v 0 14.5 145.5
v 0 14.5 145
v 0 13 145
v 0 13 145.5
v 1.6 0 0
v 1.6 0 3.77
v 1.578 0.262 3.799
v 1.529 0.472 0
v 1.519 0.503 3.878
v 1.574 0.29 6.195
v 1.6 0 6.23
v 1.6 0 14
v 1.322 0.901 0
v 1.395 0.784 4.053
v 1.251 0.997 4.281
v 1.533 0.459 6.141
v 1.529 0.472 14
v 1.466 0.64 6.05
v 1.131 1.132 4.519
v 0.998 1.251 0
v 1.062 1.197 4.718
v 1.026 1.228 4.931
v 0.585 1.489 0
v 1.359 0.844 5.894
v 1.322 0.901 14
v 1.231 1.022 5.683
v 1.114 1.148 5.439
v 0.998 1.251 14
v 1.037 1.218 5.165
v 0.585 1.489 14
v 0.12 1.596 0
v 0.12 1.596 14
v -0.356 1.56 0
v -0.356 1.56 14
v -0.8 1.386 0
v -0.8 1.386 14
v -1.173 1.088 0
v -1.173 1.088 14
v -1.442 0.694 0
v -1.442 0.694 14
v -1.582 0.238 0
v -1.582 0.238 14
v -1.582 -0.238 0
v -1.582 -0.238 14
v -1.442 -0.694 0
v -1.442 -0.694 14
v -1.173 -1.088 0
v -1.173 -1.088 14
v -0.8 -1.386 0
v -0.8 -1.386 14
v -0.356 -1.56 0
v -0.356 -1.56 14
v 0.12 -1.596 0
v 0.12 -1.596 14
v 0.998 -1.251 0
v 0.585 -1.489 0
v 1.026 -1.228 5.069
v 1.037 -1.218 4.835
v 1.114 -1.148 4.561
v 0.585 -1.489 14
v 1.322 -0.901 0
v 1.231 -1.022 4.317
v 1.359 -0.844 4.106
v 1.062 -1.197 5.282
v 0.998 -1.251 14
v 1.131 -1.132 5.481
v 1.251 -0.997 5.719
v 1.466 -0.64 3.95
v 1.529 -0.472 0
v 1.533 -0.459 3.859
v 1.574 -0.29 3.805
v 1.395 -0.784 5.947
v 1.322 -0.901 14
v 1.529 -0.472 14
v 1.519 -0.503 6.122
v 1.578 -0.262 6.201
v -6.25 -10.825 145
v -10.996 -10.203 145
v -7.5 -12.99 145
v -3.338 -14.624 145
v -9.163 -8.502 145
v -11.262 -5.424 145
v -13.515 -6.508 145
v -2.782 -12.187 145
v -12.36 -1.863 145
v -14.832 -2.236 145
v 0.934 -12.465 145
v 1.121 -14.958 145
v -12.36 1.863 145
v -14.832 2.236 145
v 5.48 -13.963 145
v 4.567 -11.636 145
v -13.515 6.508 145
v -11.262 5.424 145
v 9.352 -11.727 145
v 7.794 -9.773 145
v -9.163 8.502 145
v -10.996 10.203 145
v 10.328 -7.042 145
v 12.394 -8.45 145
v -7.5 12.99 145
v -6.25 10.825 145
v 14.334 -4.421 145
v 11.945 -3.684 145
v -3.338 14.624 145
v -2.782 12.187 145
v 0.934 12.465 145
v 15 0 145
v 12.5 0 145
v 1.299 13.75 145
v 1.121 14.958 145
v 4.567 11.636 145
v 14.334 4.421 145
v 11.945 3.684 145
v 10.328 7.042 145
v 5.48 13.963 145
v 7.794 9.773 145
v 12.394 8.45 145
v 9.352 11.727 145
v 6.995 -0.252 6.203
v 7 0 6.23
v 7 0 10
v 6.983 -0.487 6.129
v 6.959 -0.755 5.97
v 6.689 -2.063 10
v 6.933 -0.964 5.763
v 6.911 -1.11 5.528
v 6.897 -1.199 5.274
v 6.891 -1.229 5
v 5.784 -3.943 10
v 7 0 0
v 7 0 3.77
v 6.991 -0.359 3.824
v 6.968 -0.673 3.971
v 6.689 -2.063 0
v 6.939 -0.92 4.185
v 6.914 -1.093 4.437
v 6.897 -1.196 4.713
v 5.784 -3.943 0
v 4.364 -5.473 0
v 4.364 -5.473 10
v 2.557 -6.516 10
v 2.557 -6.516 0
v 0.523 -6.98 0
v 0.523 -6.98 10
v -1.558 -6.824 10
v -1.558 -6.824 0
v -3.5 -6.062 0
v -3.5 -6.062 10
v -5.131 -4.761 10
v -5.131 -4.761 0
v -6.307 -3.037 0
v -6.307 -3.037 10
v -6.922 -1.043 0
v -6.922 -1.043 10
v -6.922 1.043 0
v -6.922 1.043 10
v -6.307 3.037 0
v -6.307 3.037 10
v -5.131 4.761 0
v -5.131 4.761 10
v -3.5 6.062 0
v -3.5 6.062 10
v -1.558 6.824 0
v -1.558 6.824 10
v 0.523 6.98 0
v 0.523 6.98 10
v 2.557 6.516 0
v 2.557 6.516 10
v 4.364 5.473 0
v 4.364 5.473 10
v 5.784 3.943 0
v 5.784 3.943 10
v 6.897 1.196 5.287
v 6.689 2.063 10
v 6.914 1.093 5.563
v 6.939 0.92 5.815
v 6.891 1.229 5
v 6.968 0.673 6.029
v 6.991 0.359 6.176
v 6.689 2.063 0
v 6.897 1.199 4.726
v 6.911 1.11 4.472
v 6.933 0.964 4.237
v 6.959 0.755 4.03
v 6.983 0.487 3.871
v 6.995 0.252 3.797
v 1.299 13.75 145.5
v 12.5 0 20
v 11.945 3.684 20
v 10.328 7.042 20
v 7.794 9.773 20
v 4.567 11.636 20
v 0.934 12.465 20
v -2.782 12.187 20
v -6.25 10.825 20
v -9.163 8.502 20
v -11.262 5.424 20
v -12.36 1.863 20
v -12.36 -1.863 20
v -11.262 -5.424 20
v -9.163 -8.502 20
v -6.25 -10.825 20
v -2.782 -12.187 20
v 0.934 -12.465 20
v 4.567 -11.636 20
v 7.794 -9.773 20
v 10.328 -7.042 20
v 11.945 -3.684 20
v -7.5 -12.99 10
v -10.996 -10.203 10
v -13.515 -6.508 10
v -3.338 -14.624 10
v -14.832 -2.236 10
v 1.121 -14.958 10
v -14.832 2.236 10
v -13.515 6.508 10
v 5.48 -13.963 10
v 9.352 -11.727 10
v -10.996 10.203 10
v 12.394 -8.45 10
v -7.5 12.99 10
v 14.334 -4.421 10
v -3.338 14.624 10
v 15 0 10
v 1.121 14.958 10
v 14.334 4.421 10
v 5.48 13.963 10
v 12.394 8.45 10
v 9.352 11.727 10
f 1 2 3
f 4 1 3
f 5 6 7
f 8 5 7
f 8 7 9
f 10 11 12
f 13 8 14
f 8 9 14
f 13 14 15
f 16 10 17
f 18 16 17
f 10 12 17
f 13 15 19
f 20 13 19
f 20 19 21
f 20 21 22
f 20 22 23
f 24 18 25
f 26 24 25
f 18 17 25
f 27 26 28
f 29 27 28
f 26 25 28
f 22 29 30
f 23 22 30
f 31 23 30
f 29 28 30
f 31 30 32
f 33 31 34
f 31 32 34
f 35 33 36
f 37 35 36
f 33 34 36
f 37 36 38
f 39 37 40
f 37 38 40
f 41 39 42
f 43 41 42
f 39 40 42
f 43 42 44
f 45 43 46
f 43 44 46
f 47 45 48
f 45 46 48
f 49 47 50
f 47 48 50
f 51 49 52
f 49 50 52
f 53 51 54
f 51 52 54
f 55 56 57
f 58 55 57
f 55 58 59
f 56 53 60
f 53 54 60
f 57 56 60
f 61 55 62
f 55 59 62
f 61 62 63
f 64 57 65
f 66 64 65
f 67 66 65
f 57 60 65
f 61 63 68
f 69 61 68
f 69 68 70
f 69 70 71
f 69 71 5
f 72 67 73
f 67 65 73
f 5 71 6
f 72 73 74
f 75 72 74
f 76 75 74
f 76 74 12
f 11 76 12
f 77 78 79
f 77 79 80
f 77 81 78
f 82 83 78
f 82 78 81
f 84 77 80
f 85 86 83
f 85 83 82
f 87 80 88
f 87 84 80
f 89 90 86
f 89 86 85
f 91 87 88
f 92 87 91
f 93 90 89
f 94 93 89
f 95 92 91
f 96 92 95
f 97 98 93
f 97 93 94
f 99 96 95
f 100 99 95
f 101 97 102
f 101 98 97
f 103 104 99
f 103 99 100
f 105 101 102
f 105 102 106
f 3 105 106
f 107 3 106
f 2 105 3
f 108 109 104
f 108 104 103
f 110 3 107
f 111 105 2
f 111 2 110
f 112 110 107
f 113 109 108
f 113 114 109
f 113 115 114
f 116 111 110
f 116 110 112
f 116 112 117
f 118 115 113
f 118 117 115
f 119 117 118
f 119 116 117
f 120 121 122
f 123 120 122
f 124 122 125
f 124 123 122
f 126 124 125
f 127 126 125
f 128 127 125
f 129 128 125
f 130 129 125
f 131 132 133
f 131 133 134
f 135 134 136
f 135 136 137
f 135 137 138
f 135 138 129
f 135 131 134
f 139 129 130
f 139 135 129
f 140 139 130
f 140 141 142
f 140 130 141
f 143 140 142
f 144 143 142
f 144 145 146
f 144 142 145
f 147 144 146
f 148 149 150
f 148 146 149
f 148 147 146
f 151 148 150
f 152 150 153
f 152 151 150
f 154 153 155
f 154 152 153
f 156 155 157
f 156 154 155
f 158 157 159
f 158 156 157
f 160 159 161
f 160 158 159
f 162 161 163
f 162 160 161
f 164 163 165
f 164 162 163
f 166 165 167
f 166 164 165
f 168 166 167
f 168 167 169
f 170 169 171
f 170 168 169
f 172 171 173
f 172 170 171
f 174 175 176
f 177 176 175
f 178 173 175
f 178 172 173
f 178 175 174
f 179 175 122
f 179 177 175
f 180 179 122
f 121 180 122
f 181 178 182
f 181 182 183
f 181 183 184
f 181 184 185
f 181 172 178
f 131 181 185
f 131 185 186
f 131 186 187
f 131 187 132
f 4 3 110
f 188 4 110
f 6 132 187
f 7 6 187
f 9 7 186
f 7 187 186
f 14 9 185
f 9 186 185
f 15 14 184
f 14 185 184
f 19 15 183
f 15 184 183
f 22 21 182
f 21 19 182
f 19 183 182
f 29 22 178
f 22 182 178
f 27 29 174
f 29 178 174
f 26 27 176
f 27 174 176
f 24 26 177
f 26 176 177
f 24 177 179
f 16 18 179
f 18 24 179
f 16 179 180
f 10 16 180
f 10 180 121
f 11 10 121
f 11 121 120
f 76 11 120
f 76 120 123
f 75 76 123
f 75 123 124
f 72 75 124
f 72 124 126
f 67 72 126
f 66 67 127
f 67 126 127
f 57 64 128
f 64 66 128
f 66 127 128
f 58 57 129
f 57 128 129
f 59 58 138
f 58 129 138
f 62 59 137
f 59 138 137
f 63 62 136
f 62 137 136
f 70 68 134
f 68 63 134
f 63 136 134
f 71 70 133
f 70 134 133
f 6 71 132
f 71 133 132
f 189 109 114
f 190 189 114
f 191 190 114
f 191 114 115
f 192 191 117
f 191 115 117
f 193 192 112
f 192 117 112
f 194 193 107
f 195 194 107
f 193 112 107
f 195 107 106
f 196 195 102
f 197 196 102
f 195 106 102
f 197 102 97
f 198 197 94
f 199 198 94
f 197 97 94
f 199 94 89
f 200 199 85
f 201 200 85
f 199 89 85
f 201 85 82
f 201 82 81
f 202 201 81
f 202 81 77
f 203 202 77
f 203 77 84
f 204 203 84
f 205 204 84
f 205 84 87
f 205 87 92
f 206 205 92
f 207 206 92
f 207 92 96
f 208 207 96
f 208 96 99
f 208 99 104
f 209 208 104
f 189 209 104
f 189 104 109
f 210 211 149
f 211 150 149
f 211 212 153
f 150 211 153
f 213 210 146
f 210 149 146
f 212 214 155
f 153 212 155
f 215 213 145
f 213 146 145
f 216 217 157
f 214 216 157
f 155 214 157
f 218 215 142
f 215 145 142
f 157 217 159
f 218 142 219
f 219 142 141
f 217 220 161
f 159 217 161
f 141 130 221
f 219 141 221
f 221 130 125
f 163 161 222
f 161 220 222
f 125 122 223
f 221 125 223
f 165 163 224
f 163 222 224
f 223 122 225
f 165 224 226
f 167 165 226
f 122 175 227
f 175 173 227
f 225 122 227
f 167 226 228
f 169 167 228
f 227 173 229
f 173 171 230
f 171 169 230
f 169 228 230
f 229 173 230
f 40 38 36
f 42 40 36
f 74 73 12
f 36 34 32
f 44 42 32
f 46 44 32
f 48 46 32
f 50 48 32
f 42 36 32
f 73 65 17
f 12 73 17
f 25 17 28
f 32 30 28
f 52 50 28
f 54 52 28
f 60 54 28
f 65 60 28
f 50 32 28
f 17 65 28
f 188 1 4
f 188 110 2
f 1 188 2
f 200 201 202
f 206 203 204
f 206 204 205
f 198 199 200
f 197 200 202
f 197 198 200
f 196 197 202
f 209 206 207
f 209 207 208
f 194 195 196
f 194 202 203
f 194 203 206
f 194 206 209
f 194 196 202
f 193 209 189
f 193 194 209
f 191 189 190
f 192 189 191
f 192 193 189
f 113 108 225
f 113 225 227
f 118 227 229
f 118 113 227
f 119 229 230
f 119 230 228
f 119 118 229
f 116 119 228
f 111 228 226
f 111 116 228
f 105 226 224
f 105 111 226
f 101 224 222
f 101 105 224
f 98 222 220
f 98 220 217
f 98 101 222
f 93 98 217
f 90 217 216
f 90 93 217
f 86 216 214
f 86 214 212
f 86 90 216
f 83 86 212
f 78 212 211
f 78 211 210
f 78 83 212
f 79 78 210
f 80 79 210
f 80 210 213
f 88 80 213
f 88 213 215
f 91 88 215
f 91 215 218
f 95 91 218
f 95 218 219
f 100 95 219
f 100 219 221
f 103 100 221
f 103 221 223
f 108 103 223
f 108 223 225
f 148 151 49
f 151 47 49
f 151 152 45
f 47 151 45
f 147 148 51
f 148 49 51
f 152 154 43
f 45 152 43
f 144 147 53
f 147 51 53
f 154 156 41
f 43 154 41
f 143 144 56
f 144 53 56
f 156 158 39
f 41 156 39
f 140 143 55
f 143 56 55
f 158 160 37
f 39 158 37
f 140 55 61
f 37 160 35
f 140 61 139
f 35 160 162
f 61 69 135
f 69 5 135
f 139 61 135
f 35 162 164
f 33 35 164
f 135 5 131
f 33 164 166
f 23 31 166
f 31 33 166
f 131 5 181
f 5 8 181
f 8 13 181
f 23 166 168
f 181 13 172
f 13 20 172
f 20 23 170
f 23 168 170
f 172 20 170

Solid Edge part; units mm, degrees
sketch "Sketch1" plane through (0, 0, 0) normal (0, -1, 0) x (1, 0, 0)
  line L0 (12.5, 20) -> (12.5, 145)
  line L1 (12.5, 145) -> (15, 145)
  line L2 (15, 10) -> (15, 145)
  line L3 (7, 10) -> (15, 10)
  line L4 (7, 10) -> (7, 0)
  line L5 (1.6, 0) -> (7, 0)
  line L6 (1.6, 0) -> (1.6, 14)
  line L7 (1.6, 14) -> (0, 14)
  line L8 (0, 14) -> (0, 20)
  line L9 (0, 20) -> (12.5, 20)
revolve "RevolvedProtrusion1" add sketch "Sketch1" angle 360 about axis through (0, 0, 0) along (0, 0, 1)
sketch "Sketch2" plane through (0, 0, 145) normal (0, 0, 1) x (1, 0, 0)
  line L0 (0, 14.5) -> (0, 13)
  line L1 (0, 13) -> (1.299, 13.75)
  line L2 (1.299, 13.75) -> (0, 14.5)
extrude "ExtrudedProtrusion_1" add sketch "Sketch2" along normal blind 0.5
hole "Hole_1" at (7, 0, 5) direction (-1, 0, 0) diameter 2.459 end up to next thread major 3 thread length 2
properties material "Zinc"
